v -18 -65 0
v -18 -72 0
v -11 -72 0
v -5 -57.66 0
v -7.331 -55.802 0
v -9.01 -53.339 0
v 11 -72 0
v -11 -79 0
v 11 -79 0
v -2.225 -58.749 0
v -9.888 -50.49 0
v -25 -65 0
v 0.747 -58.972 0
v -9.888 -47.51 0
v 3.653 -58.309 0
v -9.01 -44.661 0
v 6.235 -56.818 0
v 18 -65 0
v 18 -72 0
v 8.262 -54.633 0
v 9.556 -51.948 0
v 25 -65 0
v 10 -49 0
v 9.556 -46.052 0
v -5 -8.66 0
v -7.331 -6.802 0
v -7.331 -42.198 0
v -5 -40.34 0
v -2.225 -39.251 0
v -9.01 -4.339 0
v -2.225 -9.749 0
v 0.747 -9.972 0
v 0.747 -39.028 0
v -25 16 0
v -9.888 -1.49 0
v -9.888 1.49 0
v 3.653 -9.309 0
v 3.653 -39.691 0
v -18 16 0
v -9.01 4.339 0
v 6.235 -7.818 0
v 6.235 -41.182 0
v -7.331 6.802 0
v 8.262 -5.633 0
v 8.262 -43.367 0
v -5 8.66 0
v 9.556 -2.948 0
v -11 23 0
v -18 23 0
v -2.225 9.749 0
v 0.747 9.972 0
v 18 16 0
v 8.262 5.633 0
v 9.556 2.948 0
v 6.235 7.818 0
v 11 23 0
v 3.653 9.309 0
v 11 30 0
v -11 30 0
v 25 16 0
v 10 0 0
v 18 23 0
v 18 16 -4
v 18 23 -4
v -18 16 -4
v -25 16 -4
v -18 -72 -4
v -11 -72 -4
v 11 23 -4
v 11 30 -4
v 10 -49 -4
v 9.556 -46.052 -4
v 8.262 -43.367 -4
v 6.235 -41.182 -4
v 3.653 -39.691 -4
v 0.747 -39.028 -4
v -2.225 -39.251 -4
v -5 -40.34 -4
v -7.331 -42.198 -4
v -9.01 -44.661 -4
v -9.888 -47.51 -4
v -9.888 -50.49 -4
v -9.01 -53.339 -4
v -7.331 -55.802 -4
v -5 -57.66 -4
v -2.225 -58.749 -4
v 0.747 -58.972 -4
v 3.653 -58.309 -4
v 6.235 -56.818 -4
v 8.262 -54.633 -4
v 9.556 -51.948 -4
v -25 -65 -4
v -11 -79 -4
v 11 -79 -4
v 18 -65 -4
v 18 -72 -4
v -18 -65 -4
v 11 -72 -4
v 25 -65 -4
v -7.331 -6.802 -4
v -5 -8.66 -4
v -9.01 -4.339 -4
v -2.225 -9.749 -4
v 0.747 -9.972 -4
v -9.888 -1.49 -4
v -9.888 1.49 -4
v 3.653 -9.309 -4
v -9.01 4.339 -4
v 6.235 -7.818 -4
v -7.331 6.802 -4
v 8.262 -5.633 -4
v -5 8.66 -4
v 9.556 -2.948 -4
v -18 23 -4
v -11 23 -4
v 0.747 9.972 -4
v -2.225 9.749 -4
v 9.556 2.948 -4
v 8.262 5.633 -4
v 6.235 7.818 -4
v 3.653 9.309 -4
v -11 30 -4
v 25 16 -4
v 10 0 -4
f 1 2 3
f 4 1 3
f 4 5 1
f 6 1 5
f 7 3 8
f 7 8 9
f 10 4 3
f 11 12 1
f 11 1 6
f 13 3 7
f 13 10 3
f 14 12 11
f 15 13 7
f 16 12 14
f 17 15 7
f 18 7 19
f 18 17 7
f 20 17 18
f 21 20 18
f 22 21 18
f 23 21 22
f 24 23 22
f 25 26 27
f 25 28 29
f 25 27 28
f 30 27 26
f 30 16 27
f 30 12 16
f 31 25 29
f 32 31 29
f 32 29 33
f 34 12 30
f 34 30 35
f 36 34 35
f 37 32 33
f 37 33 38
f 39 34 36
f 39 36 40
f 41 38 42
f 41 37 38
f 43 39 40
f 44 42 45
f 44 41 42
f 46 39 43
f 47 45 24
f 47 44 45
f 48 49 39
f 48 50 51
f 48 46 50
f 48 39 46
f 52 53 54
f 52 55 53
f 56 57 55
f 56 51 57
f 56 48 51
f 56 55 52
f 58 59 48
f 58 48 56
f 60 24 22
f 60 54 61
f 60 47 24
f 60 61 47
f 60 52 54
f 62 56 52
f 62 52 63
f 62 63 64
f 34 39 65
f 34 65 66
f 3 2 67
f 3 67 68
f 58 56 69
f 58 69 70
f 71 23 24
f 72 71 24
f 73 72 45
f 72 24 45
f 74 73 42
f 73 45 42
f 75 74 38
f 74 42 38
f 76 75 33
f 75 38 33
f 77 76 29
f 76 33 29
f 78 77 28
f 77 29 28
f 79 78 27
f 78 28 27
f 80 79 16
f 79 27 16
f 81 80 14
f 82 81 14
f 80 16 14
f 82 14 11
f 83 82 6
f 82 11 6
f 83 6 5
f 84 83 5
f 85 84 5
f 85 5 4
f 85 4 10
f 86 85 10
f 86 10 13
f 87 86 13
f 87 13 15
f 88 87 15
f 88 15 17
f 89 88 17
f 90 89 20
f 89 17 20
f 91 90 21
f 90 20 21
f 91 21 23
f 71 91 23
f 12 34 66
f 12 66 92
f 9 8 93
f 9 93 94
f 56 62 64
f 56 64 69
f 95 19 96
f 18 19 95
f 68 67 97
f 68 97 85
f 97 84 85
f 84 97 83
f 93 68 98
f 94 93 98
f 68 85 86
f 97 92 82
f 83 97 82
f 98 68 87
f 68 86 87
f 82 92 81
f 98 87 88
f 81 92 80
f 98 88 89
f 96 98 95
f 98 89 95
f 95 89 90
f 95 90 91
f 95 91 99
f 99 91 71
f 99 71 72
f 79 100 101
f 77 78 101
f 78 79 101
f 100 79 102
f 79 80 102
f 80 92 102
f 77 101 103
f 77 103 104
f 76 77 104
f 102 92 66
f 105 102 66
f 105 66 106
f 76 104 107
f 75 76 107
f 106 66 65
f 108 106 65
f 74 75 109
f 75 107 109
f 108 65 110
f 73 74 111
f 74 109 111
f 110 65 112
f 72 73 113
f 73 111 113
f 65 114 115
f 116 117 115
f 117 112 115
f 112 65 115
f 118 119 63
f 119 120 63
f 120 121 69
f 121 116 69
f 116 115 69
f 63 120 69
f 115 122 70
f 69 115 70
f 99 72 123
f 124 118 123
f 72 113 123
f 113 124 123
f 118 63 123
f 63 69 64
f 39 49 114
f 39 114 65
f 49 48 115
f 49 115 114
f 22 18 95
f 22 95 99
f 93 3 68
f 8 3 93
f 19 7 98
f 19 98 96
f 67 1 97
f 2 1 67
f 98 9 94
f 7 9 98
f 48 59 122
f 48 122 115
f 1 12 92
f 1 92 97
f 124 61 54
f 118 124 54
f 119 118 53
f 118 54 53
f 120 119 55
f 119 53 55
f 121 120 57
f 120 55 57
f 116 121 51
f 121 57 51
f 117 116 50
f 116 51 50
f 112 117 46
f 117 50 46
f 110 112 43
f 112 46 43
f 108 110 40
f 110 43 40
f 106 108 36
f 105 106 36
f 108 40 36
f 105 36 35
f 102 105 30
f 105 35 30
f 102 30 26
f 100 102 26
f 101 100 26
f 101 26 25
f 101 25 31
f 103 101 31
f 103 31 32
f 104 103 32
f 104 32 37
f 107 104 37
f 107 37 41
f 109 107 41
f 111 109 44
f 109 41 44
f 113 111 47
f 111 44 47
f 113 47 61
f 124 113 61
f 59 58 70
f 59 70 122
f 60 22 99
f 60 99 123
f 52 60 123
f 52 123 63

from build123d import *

# Parameters (mm, degrees)
SKETCH_1_R             = 10
SM_BASE_FLANGE_1_DEPTH = 4


# Sheet-metal steps are written as plain solids
with BuildPart() as part:
    # Sketch 1 → Базовая кромка1 (new body)
    with BuildSketch(Plane.XY):
        Polygon((-25, 16), (-25, -65), (-18, -65), (-18, -72), (-11, -72), (-11, -79), (11, -79), (11, -72), (18, -72), (18, -65), (25, -65), (25, 16), (18, 16), (18, 23), (11, 23), (11, 30), (-11, 30), (-11, 23), (-18, 23), (-18, 16), align=None)
        Circle(SKETCH_1_R, mode=Mode.SUBTRACT)
        with Locations((0, -49)):
            Circle(SKETCH_1_R, mode=Mode.SUBTRACT)
    extrude(amount=-SM_BASE_FLANGE_1_DEPTH)


solid = part.part
